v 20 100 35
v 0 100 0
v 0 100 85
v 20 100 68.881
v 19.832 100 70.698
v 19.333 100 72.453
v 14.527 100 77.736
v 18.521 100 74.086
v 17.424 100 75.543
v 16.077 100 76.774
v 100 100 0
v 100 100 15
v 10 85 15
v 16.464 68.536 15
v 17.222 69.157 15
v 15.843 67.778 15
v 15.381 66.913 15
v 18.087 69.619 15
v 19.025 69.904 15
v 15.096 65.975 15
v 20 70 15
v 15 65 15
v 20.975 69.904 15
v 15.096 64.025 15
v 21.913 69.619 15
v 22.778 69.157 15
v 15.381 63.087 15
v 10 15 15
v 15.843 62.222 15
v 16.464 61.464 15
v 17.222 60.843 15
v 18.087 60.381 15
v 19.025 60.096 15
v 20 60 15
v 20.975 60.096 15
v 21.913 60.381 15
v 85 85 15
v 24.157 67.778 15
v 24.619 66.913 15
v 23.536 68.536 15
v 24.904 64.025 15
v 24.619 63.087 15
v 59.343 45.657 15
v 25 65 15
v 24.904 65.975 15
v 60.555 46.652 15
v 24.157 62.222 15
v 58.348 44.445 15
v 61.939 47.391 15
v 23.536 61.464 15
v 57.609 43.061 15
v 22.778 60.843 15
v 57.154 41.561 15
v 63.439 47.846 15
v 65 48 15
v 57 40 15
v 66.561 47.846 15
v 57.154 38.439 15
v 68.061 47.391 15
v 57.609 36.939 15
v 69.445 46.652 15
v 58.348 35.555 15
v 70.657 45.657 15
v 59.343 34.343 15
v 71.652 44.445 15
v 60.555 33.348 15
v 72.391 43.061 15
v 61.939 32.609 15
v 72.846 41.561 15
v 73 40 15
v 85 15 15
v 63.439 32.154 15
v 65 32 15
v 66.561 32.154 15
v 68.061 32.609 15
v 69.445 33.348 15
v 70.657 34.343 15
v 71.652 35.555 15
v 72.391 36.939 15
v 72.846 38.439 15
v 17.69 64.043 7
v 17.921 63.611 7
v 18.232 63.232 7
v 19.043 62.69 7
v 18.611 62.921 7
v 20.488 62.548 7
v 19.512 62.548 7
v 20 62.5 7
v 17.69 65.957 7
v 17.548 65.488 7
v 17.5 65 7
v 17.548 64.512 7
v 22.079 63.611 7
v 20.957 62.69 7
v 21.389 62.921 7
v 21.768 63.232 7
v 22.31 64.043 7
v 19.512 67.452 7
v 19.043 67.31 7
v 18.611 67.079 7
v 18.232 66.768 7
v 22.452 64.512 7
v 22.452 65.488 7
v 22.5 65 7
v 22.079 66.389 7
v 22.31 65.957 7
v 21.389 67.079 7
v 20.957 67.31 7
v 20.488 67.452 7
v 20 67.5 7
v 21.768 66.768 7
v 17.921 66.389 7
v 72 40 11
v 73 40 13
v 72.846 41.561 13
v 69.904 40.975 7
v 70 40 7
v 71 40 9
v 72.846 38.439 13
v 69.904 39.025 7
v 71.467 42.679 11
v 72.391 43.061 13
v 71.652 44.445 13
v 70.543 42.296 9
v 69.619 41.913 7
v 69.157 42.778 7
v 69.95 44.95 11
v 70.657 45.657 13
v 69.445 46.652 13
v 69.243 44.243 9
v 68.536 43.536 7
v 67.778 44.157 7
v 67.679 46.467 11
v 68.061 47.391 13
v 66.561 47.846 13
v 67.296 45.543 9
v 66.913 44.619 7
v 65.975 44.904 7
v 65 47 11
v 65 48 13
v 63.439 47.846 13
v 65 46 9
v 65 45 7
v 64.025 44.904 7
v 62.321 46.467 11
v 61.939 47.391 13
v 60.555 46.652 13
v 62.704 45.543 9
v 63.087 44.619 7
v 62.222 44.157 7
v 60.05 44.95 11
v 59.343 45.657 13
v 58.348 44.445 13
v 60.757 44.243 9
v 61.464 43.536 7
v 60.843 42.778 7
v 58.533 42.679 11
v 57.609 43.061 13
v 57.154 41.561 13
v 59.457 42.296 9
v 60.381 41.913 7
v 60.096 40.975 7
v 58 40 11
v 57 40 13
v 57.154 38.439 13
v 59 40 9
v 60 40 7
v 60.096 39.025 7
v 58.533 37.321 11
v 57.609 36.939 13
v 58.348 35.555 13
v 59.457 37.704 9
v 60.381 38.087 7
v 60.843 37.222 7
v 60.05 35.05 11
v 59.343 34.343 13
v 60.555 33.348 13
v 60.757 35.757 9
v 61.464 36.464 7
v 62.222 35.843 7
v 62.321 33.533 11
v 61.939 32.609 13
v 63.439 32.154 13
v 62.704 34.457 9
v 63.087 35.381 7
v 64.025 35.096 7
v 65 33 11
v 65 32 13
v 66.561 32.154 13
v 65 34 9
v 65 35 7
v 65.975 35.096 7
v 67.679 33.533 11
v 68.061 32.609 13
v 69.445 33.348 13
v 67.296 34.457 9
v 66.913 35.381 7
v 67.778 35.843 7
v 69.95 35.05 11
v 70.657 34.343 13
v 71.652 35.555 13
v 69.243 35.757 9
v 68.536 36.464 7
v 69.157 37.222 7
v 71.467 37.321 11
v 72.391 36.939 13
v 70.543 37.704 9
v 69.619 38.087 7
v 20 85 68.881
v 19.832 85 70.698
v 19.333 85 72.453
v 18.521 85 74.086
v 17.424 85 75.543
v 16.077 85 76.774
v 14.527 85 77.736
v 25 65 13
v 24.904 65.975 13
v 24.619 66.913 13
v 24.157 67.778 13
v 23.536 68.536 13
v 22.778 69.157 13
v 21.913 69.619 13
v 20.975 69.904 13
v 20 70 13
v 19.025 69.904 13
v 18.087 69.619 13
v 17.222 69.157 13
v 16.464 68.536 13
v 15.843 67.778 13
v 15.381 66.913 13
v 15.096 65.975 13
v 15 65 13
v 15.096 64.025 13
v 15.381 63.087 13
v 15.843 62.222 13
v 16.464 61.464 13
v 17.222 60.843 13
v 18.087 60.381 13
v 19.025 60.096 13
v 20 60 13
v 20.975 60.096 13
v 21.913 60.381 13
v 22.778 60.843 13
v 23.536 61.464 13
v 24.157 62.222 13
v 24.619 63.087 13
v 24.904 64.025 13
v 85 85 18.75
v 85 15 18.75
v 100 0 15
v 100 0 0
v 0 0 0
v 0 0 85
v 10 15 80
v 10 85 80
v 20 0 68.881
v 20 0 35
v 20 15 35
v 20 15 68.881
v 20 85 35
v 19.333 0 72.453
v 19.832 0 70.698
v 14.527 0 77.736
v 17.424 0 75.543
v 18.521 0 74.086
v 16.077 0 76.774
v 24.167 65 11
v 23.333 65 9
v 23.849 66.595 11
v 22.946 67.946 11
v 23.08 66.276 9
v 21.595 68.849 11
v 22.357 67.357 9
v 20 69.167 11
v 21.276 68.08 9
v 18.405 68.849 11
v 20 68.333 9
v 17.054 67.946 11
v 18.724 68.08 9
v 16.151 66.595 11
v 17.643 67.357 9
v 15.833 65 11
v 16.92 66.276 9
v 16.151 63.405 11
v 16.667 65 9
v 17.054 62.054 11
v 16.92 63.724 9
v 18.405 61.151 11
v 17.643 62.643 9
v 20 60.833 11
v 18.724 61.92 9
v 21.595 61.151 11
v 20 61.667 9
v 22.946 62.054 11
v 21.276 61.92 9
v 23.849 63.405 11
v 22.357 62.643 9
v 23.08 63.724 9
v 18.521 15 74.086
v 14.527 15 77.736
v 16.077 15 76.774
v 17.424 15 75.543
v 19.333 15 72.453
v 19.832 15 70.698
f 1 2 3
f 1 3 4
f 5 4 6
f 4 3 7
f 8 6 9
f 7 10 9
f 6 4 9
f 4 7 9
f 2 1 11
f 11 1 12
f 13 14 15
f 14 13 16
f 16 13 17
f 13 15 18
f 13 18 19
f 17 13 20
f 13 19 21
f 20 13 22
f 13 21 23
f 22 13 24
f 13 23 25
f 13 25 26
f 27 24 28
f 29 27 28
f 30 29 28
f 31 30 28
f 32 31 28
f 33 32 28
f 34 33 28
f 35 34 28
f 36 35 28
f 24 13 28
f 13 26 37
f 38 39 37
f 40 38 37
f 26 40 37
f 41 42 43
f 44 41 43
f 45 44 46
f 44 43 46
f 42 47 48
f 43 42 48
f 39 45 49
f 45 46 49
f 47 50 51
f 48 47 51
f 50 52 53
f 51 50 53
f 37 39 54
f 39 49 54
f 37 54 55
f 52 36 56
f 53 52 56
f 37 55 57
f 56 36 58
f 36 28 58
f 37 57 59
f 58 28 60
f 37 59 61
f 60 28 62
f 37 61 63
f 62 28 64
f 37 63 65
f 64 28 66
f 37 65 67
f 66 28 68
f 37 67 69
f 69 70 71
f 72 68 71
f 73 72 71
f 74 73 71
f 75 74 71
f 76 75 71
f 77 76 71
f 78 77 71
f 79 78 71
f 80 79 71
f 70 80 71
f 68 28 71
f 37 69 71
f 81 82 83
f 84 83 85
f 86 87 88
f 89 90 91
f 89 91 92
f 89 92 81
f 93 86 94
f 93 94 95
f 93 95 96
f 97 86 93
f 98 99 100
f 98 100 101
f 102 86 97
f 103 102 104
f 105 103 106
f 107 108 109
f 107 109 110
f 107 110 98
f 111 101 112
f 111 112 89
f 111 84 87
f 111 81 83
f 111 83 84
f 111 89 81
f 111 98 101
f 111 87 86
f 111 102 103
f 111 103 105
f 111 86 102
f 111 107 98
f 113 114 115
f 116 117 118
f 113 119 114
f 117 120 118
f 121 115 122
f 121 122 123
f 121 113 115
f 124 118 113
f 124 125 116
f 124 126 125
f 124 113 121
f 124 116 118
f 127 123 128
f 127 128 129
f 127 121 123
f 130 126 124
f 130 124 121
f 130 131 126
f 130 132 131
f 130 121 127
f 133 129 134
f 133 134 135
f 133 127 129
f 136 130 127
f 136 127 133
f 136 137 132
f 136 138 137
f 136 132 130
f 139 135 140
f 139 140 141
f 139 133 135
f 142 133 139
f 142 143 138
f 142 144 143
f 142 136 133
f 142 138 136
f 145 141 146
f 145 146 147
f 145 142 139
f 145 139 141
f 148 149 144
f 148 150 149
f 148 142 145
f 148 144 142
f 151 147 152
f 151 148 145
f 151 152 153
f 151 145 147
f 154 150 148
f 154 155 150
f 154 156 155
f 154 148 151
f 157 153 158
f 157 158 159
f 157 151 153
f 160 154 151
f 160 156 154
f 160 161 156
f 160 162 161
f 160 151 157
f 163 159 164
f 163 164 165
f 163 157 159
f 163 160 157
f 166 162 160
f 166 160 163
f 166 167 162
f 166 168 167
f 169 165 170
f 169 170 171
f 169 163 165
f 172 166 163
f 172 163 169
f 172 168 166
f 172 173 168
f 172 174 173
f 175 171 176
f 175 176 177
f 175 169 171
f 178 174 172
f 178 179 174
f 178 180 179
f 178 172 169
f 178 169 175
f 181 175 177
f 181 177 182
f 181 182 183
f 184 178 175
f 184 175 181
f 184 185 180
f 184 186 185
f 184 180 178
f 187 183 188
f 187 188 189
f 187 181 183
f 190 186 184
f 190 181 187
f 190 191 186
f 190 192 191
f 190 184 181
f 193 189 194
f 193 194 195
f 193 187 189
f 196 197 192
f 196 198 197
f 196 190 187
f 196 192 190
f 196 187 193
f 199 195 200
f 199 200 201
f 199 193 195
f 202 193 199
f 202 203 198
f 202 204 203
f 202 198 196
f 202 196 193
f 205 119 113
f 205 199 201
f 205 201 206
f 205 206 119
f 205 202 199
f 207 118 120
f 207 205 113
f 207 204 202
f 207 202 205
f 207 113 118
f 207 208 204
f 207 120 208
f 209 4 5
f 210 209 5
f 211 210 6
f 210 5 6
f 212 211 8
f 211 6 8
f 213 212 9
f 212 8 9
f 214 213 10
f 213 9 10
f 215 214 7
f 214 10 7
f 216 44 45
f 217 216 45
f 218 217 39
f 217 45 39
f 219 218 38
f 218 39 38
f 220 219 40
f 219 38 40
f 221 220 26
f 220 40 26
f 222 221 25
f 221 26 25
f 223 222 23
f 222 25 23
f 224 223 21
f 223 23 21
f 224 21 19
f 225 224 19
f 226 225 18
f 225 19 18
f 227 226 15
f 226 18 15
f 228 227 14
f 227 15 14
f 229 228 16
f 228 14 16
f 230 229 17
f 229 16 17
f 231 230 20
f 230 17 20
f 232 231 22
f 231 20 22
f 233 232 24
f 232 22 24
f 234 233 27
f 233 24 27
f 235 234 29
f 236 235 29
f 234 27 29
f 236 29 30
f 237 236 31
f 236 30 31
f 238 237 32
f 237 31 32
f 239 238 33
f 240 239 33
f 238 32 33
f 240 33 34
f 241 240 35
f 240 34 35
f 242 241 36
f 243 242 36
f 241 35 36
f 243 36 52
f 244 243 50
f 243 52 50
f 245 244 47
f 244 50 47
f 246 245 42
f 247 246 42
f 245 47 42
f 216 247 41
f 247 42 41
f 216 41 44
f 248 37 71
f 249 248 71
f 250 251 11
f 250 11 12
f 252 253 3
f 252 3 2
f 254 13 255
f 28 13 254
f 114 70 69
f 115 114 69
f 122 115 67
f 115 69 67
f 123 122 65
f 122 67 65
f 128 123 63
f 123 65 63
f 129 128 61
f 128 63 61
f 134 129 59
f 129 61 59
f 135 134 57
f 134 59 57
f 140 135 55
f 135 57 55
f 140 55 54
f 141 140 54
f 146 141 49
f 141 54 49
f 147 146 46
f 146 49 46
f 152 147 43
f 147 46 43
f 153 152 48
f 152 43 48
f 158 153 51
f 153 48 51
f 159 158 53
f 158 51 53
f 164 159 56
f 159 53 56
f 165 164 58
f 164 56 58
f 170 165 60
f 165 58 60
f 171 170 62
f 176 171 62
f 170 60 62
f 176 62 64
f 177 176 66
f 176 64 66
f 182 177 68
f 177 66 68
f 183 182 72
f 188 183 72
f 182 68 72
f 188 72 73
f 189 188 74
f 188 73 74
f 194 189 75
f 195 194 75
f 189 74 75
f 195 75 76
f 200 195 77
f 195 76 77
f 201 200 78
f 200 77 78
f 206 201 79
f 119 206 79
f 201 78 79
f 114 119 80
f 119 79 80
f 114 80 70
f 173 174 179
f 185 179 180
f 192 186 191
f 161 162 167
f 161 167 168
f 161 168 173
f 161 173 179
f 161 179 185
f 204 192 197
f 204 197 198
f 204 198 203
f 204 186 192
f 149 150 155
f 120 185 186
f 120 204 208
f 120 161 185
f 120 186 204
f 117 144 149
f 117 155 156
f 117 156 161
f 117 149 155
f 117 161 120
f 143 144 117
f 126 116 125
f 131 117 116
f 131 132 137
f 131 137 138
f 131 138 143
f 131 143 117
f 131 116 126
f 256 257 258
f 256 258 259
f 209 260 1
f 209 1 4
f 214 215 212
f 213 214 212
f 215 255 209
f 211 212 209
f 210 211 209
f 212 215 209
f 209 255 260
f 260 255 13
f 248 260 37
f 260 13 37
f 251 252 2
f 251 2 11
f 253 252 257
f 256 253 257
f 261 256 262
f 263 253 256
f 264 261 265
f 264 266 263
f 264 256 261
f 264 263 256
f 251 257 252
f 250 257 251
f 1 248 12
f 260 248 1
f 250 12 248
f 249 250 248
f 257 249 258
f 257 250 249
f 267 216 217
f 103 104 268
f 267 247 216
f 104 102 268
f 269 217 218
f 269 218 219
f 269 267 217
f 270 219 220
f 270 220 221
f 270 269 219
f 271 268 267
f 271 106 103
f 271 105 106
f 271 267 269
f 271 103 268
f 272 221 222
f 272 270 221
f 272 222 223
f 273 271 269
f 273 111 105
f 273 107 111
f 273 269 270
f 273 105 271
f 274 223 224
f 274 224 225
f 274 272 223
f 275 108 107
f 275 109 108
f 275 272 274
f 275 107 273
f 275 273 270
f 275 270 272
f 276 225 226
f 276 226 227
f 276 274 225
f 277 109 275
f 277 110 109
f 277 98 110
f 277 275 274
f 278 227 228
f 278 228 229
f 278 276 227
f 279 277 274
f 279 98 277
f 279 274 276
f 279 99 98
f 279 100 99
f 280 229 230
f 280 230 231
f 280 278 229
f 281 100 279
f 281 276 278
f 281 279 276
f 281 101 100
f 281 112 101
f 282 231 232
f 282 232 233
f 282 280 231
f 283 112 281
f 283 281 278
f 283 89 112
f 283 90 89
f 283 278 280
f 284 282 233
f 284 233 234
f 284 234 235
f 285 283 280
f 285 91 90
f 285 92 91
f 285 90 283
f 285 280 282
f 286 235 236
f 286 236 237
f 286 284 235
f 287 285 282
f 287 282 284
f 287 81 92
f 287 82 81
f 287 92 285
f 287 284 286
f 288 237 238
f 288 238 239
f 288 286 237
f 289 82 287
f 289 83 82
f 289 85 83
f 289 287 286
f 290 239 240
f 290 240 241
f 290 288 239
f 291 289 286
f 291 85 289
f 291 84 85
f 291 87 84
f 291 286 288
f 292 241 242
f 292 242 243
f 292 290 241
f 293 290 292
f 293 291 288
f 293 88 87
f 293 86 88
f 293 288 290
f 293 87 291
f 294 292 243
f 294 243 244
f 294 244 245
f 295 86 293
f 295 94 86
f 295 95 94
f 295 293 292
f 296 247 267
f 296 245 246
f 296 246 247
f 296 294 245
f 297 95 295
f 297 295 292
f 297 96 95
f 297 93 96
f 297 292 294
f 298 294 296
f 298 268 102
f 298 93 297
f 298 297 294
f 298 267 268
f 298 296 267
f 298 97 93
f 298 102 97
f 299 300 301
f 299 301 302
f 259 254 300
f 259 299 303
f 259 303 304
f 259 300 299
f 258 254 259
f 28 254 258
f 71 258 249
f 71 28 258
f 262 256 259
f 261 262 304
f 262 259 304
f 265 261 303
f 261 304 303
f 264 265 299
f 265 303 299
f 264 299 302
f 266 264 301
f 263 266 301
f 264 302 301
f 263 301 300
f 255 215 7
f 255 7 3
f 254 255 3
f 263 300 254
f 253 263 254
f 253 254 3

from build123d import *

# Parameters (mm, degrees)
F1_DEPTH  = 100
F2_R      = 9.9
F4_W      = 75
F4_H      = 70
F5_DEPTH  = 70.001
F6_R      = 5
F6_R_2    = 8
F7_DEPTH  = 8
F10_SIZE2 = 2.5
F10_SIZE  = 6
F11_SIZE2 = 3
F11_SIZE  = 6


with BuildPart() as f1:
    # F0 (on Front) → F1 (new body)
    with BuildSketch(Plane.XZ):
        Polygon((0, 85), (0, 0), (100, 0), (100, 15), (20, 35), (20, 75), align=None)
    extrude(amount=-F1_DEPTH)

    # F2
    f2_edges = [f1.edges().sort_by_distance(p)[0] for p in [
        (20, 50, 75),
    ]]
    fillet(f2_edges, radius=F2_R)

    # F4 (on offset) → F5 (cut, through all)
    with BuildSketch(Plane(origin=(0, 0, 15), x_dir=(1, 0, 0), z_dir=(0, 0, -1))):
        with Locations((47.5, -50)):
            Rectangle(F4_W, F4_H)
    extrude(amount=-F5_DEPTH, mode=Mode.SUBTRACT)

    # F6 (on face) → F7 (cut)
    with BuildSketch(Plane.XY.offset(15)):
        with Locations((20, 65)):
            Circle(F6_R)
        with Locations((65, 40)):
            Circle(F6_R_2)
    extrude(amount=-F7_DEPTH, mode=Mode.SUBTRACT)

    # F10
    f10_edges = [f1.edges().sort_by_distance(p)[0] for p in [
        (15, 65, 7),
    ]]
    f10_side = f1.faces().sort_by_distance((15, 65, 11))[0]
    chamfer(f10_edges, length=F10_SIZE, length2=F10_SIZE2, reference=f10_side)

    # F11
    f11_edges = [f1.edges().sort_by_distance(p)[0] for p in [
        (57, 40, 7),
    ]]
    f11_side = f1.faces().sort_by_distance((57, 40, 11))[0]
    chamfer(f11_edges, length=F11_SIZE, length2=F11_SIZE2, reference=f11_side)


solid = f1.part
